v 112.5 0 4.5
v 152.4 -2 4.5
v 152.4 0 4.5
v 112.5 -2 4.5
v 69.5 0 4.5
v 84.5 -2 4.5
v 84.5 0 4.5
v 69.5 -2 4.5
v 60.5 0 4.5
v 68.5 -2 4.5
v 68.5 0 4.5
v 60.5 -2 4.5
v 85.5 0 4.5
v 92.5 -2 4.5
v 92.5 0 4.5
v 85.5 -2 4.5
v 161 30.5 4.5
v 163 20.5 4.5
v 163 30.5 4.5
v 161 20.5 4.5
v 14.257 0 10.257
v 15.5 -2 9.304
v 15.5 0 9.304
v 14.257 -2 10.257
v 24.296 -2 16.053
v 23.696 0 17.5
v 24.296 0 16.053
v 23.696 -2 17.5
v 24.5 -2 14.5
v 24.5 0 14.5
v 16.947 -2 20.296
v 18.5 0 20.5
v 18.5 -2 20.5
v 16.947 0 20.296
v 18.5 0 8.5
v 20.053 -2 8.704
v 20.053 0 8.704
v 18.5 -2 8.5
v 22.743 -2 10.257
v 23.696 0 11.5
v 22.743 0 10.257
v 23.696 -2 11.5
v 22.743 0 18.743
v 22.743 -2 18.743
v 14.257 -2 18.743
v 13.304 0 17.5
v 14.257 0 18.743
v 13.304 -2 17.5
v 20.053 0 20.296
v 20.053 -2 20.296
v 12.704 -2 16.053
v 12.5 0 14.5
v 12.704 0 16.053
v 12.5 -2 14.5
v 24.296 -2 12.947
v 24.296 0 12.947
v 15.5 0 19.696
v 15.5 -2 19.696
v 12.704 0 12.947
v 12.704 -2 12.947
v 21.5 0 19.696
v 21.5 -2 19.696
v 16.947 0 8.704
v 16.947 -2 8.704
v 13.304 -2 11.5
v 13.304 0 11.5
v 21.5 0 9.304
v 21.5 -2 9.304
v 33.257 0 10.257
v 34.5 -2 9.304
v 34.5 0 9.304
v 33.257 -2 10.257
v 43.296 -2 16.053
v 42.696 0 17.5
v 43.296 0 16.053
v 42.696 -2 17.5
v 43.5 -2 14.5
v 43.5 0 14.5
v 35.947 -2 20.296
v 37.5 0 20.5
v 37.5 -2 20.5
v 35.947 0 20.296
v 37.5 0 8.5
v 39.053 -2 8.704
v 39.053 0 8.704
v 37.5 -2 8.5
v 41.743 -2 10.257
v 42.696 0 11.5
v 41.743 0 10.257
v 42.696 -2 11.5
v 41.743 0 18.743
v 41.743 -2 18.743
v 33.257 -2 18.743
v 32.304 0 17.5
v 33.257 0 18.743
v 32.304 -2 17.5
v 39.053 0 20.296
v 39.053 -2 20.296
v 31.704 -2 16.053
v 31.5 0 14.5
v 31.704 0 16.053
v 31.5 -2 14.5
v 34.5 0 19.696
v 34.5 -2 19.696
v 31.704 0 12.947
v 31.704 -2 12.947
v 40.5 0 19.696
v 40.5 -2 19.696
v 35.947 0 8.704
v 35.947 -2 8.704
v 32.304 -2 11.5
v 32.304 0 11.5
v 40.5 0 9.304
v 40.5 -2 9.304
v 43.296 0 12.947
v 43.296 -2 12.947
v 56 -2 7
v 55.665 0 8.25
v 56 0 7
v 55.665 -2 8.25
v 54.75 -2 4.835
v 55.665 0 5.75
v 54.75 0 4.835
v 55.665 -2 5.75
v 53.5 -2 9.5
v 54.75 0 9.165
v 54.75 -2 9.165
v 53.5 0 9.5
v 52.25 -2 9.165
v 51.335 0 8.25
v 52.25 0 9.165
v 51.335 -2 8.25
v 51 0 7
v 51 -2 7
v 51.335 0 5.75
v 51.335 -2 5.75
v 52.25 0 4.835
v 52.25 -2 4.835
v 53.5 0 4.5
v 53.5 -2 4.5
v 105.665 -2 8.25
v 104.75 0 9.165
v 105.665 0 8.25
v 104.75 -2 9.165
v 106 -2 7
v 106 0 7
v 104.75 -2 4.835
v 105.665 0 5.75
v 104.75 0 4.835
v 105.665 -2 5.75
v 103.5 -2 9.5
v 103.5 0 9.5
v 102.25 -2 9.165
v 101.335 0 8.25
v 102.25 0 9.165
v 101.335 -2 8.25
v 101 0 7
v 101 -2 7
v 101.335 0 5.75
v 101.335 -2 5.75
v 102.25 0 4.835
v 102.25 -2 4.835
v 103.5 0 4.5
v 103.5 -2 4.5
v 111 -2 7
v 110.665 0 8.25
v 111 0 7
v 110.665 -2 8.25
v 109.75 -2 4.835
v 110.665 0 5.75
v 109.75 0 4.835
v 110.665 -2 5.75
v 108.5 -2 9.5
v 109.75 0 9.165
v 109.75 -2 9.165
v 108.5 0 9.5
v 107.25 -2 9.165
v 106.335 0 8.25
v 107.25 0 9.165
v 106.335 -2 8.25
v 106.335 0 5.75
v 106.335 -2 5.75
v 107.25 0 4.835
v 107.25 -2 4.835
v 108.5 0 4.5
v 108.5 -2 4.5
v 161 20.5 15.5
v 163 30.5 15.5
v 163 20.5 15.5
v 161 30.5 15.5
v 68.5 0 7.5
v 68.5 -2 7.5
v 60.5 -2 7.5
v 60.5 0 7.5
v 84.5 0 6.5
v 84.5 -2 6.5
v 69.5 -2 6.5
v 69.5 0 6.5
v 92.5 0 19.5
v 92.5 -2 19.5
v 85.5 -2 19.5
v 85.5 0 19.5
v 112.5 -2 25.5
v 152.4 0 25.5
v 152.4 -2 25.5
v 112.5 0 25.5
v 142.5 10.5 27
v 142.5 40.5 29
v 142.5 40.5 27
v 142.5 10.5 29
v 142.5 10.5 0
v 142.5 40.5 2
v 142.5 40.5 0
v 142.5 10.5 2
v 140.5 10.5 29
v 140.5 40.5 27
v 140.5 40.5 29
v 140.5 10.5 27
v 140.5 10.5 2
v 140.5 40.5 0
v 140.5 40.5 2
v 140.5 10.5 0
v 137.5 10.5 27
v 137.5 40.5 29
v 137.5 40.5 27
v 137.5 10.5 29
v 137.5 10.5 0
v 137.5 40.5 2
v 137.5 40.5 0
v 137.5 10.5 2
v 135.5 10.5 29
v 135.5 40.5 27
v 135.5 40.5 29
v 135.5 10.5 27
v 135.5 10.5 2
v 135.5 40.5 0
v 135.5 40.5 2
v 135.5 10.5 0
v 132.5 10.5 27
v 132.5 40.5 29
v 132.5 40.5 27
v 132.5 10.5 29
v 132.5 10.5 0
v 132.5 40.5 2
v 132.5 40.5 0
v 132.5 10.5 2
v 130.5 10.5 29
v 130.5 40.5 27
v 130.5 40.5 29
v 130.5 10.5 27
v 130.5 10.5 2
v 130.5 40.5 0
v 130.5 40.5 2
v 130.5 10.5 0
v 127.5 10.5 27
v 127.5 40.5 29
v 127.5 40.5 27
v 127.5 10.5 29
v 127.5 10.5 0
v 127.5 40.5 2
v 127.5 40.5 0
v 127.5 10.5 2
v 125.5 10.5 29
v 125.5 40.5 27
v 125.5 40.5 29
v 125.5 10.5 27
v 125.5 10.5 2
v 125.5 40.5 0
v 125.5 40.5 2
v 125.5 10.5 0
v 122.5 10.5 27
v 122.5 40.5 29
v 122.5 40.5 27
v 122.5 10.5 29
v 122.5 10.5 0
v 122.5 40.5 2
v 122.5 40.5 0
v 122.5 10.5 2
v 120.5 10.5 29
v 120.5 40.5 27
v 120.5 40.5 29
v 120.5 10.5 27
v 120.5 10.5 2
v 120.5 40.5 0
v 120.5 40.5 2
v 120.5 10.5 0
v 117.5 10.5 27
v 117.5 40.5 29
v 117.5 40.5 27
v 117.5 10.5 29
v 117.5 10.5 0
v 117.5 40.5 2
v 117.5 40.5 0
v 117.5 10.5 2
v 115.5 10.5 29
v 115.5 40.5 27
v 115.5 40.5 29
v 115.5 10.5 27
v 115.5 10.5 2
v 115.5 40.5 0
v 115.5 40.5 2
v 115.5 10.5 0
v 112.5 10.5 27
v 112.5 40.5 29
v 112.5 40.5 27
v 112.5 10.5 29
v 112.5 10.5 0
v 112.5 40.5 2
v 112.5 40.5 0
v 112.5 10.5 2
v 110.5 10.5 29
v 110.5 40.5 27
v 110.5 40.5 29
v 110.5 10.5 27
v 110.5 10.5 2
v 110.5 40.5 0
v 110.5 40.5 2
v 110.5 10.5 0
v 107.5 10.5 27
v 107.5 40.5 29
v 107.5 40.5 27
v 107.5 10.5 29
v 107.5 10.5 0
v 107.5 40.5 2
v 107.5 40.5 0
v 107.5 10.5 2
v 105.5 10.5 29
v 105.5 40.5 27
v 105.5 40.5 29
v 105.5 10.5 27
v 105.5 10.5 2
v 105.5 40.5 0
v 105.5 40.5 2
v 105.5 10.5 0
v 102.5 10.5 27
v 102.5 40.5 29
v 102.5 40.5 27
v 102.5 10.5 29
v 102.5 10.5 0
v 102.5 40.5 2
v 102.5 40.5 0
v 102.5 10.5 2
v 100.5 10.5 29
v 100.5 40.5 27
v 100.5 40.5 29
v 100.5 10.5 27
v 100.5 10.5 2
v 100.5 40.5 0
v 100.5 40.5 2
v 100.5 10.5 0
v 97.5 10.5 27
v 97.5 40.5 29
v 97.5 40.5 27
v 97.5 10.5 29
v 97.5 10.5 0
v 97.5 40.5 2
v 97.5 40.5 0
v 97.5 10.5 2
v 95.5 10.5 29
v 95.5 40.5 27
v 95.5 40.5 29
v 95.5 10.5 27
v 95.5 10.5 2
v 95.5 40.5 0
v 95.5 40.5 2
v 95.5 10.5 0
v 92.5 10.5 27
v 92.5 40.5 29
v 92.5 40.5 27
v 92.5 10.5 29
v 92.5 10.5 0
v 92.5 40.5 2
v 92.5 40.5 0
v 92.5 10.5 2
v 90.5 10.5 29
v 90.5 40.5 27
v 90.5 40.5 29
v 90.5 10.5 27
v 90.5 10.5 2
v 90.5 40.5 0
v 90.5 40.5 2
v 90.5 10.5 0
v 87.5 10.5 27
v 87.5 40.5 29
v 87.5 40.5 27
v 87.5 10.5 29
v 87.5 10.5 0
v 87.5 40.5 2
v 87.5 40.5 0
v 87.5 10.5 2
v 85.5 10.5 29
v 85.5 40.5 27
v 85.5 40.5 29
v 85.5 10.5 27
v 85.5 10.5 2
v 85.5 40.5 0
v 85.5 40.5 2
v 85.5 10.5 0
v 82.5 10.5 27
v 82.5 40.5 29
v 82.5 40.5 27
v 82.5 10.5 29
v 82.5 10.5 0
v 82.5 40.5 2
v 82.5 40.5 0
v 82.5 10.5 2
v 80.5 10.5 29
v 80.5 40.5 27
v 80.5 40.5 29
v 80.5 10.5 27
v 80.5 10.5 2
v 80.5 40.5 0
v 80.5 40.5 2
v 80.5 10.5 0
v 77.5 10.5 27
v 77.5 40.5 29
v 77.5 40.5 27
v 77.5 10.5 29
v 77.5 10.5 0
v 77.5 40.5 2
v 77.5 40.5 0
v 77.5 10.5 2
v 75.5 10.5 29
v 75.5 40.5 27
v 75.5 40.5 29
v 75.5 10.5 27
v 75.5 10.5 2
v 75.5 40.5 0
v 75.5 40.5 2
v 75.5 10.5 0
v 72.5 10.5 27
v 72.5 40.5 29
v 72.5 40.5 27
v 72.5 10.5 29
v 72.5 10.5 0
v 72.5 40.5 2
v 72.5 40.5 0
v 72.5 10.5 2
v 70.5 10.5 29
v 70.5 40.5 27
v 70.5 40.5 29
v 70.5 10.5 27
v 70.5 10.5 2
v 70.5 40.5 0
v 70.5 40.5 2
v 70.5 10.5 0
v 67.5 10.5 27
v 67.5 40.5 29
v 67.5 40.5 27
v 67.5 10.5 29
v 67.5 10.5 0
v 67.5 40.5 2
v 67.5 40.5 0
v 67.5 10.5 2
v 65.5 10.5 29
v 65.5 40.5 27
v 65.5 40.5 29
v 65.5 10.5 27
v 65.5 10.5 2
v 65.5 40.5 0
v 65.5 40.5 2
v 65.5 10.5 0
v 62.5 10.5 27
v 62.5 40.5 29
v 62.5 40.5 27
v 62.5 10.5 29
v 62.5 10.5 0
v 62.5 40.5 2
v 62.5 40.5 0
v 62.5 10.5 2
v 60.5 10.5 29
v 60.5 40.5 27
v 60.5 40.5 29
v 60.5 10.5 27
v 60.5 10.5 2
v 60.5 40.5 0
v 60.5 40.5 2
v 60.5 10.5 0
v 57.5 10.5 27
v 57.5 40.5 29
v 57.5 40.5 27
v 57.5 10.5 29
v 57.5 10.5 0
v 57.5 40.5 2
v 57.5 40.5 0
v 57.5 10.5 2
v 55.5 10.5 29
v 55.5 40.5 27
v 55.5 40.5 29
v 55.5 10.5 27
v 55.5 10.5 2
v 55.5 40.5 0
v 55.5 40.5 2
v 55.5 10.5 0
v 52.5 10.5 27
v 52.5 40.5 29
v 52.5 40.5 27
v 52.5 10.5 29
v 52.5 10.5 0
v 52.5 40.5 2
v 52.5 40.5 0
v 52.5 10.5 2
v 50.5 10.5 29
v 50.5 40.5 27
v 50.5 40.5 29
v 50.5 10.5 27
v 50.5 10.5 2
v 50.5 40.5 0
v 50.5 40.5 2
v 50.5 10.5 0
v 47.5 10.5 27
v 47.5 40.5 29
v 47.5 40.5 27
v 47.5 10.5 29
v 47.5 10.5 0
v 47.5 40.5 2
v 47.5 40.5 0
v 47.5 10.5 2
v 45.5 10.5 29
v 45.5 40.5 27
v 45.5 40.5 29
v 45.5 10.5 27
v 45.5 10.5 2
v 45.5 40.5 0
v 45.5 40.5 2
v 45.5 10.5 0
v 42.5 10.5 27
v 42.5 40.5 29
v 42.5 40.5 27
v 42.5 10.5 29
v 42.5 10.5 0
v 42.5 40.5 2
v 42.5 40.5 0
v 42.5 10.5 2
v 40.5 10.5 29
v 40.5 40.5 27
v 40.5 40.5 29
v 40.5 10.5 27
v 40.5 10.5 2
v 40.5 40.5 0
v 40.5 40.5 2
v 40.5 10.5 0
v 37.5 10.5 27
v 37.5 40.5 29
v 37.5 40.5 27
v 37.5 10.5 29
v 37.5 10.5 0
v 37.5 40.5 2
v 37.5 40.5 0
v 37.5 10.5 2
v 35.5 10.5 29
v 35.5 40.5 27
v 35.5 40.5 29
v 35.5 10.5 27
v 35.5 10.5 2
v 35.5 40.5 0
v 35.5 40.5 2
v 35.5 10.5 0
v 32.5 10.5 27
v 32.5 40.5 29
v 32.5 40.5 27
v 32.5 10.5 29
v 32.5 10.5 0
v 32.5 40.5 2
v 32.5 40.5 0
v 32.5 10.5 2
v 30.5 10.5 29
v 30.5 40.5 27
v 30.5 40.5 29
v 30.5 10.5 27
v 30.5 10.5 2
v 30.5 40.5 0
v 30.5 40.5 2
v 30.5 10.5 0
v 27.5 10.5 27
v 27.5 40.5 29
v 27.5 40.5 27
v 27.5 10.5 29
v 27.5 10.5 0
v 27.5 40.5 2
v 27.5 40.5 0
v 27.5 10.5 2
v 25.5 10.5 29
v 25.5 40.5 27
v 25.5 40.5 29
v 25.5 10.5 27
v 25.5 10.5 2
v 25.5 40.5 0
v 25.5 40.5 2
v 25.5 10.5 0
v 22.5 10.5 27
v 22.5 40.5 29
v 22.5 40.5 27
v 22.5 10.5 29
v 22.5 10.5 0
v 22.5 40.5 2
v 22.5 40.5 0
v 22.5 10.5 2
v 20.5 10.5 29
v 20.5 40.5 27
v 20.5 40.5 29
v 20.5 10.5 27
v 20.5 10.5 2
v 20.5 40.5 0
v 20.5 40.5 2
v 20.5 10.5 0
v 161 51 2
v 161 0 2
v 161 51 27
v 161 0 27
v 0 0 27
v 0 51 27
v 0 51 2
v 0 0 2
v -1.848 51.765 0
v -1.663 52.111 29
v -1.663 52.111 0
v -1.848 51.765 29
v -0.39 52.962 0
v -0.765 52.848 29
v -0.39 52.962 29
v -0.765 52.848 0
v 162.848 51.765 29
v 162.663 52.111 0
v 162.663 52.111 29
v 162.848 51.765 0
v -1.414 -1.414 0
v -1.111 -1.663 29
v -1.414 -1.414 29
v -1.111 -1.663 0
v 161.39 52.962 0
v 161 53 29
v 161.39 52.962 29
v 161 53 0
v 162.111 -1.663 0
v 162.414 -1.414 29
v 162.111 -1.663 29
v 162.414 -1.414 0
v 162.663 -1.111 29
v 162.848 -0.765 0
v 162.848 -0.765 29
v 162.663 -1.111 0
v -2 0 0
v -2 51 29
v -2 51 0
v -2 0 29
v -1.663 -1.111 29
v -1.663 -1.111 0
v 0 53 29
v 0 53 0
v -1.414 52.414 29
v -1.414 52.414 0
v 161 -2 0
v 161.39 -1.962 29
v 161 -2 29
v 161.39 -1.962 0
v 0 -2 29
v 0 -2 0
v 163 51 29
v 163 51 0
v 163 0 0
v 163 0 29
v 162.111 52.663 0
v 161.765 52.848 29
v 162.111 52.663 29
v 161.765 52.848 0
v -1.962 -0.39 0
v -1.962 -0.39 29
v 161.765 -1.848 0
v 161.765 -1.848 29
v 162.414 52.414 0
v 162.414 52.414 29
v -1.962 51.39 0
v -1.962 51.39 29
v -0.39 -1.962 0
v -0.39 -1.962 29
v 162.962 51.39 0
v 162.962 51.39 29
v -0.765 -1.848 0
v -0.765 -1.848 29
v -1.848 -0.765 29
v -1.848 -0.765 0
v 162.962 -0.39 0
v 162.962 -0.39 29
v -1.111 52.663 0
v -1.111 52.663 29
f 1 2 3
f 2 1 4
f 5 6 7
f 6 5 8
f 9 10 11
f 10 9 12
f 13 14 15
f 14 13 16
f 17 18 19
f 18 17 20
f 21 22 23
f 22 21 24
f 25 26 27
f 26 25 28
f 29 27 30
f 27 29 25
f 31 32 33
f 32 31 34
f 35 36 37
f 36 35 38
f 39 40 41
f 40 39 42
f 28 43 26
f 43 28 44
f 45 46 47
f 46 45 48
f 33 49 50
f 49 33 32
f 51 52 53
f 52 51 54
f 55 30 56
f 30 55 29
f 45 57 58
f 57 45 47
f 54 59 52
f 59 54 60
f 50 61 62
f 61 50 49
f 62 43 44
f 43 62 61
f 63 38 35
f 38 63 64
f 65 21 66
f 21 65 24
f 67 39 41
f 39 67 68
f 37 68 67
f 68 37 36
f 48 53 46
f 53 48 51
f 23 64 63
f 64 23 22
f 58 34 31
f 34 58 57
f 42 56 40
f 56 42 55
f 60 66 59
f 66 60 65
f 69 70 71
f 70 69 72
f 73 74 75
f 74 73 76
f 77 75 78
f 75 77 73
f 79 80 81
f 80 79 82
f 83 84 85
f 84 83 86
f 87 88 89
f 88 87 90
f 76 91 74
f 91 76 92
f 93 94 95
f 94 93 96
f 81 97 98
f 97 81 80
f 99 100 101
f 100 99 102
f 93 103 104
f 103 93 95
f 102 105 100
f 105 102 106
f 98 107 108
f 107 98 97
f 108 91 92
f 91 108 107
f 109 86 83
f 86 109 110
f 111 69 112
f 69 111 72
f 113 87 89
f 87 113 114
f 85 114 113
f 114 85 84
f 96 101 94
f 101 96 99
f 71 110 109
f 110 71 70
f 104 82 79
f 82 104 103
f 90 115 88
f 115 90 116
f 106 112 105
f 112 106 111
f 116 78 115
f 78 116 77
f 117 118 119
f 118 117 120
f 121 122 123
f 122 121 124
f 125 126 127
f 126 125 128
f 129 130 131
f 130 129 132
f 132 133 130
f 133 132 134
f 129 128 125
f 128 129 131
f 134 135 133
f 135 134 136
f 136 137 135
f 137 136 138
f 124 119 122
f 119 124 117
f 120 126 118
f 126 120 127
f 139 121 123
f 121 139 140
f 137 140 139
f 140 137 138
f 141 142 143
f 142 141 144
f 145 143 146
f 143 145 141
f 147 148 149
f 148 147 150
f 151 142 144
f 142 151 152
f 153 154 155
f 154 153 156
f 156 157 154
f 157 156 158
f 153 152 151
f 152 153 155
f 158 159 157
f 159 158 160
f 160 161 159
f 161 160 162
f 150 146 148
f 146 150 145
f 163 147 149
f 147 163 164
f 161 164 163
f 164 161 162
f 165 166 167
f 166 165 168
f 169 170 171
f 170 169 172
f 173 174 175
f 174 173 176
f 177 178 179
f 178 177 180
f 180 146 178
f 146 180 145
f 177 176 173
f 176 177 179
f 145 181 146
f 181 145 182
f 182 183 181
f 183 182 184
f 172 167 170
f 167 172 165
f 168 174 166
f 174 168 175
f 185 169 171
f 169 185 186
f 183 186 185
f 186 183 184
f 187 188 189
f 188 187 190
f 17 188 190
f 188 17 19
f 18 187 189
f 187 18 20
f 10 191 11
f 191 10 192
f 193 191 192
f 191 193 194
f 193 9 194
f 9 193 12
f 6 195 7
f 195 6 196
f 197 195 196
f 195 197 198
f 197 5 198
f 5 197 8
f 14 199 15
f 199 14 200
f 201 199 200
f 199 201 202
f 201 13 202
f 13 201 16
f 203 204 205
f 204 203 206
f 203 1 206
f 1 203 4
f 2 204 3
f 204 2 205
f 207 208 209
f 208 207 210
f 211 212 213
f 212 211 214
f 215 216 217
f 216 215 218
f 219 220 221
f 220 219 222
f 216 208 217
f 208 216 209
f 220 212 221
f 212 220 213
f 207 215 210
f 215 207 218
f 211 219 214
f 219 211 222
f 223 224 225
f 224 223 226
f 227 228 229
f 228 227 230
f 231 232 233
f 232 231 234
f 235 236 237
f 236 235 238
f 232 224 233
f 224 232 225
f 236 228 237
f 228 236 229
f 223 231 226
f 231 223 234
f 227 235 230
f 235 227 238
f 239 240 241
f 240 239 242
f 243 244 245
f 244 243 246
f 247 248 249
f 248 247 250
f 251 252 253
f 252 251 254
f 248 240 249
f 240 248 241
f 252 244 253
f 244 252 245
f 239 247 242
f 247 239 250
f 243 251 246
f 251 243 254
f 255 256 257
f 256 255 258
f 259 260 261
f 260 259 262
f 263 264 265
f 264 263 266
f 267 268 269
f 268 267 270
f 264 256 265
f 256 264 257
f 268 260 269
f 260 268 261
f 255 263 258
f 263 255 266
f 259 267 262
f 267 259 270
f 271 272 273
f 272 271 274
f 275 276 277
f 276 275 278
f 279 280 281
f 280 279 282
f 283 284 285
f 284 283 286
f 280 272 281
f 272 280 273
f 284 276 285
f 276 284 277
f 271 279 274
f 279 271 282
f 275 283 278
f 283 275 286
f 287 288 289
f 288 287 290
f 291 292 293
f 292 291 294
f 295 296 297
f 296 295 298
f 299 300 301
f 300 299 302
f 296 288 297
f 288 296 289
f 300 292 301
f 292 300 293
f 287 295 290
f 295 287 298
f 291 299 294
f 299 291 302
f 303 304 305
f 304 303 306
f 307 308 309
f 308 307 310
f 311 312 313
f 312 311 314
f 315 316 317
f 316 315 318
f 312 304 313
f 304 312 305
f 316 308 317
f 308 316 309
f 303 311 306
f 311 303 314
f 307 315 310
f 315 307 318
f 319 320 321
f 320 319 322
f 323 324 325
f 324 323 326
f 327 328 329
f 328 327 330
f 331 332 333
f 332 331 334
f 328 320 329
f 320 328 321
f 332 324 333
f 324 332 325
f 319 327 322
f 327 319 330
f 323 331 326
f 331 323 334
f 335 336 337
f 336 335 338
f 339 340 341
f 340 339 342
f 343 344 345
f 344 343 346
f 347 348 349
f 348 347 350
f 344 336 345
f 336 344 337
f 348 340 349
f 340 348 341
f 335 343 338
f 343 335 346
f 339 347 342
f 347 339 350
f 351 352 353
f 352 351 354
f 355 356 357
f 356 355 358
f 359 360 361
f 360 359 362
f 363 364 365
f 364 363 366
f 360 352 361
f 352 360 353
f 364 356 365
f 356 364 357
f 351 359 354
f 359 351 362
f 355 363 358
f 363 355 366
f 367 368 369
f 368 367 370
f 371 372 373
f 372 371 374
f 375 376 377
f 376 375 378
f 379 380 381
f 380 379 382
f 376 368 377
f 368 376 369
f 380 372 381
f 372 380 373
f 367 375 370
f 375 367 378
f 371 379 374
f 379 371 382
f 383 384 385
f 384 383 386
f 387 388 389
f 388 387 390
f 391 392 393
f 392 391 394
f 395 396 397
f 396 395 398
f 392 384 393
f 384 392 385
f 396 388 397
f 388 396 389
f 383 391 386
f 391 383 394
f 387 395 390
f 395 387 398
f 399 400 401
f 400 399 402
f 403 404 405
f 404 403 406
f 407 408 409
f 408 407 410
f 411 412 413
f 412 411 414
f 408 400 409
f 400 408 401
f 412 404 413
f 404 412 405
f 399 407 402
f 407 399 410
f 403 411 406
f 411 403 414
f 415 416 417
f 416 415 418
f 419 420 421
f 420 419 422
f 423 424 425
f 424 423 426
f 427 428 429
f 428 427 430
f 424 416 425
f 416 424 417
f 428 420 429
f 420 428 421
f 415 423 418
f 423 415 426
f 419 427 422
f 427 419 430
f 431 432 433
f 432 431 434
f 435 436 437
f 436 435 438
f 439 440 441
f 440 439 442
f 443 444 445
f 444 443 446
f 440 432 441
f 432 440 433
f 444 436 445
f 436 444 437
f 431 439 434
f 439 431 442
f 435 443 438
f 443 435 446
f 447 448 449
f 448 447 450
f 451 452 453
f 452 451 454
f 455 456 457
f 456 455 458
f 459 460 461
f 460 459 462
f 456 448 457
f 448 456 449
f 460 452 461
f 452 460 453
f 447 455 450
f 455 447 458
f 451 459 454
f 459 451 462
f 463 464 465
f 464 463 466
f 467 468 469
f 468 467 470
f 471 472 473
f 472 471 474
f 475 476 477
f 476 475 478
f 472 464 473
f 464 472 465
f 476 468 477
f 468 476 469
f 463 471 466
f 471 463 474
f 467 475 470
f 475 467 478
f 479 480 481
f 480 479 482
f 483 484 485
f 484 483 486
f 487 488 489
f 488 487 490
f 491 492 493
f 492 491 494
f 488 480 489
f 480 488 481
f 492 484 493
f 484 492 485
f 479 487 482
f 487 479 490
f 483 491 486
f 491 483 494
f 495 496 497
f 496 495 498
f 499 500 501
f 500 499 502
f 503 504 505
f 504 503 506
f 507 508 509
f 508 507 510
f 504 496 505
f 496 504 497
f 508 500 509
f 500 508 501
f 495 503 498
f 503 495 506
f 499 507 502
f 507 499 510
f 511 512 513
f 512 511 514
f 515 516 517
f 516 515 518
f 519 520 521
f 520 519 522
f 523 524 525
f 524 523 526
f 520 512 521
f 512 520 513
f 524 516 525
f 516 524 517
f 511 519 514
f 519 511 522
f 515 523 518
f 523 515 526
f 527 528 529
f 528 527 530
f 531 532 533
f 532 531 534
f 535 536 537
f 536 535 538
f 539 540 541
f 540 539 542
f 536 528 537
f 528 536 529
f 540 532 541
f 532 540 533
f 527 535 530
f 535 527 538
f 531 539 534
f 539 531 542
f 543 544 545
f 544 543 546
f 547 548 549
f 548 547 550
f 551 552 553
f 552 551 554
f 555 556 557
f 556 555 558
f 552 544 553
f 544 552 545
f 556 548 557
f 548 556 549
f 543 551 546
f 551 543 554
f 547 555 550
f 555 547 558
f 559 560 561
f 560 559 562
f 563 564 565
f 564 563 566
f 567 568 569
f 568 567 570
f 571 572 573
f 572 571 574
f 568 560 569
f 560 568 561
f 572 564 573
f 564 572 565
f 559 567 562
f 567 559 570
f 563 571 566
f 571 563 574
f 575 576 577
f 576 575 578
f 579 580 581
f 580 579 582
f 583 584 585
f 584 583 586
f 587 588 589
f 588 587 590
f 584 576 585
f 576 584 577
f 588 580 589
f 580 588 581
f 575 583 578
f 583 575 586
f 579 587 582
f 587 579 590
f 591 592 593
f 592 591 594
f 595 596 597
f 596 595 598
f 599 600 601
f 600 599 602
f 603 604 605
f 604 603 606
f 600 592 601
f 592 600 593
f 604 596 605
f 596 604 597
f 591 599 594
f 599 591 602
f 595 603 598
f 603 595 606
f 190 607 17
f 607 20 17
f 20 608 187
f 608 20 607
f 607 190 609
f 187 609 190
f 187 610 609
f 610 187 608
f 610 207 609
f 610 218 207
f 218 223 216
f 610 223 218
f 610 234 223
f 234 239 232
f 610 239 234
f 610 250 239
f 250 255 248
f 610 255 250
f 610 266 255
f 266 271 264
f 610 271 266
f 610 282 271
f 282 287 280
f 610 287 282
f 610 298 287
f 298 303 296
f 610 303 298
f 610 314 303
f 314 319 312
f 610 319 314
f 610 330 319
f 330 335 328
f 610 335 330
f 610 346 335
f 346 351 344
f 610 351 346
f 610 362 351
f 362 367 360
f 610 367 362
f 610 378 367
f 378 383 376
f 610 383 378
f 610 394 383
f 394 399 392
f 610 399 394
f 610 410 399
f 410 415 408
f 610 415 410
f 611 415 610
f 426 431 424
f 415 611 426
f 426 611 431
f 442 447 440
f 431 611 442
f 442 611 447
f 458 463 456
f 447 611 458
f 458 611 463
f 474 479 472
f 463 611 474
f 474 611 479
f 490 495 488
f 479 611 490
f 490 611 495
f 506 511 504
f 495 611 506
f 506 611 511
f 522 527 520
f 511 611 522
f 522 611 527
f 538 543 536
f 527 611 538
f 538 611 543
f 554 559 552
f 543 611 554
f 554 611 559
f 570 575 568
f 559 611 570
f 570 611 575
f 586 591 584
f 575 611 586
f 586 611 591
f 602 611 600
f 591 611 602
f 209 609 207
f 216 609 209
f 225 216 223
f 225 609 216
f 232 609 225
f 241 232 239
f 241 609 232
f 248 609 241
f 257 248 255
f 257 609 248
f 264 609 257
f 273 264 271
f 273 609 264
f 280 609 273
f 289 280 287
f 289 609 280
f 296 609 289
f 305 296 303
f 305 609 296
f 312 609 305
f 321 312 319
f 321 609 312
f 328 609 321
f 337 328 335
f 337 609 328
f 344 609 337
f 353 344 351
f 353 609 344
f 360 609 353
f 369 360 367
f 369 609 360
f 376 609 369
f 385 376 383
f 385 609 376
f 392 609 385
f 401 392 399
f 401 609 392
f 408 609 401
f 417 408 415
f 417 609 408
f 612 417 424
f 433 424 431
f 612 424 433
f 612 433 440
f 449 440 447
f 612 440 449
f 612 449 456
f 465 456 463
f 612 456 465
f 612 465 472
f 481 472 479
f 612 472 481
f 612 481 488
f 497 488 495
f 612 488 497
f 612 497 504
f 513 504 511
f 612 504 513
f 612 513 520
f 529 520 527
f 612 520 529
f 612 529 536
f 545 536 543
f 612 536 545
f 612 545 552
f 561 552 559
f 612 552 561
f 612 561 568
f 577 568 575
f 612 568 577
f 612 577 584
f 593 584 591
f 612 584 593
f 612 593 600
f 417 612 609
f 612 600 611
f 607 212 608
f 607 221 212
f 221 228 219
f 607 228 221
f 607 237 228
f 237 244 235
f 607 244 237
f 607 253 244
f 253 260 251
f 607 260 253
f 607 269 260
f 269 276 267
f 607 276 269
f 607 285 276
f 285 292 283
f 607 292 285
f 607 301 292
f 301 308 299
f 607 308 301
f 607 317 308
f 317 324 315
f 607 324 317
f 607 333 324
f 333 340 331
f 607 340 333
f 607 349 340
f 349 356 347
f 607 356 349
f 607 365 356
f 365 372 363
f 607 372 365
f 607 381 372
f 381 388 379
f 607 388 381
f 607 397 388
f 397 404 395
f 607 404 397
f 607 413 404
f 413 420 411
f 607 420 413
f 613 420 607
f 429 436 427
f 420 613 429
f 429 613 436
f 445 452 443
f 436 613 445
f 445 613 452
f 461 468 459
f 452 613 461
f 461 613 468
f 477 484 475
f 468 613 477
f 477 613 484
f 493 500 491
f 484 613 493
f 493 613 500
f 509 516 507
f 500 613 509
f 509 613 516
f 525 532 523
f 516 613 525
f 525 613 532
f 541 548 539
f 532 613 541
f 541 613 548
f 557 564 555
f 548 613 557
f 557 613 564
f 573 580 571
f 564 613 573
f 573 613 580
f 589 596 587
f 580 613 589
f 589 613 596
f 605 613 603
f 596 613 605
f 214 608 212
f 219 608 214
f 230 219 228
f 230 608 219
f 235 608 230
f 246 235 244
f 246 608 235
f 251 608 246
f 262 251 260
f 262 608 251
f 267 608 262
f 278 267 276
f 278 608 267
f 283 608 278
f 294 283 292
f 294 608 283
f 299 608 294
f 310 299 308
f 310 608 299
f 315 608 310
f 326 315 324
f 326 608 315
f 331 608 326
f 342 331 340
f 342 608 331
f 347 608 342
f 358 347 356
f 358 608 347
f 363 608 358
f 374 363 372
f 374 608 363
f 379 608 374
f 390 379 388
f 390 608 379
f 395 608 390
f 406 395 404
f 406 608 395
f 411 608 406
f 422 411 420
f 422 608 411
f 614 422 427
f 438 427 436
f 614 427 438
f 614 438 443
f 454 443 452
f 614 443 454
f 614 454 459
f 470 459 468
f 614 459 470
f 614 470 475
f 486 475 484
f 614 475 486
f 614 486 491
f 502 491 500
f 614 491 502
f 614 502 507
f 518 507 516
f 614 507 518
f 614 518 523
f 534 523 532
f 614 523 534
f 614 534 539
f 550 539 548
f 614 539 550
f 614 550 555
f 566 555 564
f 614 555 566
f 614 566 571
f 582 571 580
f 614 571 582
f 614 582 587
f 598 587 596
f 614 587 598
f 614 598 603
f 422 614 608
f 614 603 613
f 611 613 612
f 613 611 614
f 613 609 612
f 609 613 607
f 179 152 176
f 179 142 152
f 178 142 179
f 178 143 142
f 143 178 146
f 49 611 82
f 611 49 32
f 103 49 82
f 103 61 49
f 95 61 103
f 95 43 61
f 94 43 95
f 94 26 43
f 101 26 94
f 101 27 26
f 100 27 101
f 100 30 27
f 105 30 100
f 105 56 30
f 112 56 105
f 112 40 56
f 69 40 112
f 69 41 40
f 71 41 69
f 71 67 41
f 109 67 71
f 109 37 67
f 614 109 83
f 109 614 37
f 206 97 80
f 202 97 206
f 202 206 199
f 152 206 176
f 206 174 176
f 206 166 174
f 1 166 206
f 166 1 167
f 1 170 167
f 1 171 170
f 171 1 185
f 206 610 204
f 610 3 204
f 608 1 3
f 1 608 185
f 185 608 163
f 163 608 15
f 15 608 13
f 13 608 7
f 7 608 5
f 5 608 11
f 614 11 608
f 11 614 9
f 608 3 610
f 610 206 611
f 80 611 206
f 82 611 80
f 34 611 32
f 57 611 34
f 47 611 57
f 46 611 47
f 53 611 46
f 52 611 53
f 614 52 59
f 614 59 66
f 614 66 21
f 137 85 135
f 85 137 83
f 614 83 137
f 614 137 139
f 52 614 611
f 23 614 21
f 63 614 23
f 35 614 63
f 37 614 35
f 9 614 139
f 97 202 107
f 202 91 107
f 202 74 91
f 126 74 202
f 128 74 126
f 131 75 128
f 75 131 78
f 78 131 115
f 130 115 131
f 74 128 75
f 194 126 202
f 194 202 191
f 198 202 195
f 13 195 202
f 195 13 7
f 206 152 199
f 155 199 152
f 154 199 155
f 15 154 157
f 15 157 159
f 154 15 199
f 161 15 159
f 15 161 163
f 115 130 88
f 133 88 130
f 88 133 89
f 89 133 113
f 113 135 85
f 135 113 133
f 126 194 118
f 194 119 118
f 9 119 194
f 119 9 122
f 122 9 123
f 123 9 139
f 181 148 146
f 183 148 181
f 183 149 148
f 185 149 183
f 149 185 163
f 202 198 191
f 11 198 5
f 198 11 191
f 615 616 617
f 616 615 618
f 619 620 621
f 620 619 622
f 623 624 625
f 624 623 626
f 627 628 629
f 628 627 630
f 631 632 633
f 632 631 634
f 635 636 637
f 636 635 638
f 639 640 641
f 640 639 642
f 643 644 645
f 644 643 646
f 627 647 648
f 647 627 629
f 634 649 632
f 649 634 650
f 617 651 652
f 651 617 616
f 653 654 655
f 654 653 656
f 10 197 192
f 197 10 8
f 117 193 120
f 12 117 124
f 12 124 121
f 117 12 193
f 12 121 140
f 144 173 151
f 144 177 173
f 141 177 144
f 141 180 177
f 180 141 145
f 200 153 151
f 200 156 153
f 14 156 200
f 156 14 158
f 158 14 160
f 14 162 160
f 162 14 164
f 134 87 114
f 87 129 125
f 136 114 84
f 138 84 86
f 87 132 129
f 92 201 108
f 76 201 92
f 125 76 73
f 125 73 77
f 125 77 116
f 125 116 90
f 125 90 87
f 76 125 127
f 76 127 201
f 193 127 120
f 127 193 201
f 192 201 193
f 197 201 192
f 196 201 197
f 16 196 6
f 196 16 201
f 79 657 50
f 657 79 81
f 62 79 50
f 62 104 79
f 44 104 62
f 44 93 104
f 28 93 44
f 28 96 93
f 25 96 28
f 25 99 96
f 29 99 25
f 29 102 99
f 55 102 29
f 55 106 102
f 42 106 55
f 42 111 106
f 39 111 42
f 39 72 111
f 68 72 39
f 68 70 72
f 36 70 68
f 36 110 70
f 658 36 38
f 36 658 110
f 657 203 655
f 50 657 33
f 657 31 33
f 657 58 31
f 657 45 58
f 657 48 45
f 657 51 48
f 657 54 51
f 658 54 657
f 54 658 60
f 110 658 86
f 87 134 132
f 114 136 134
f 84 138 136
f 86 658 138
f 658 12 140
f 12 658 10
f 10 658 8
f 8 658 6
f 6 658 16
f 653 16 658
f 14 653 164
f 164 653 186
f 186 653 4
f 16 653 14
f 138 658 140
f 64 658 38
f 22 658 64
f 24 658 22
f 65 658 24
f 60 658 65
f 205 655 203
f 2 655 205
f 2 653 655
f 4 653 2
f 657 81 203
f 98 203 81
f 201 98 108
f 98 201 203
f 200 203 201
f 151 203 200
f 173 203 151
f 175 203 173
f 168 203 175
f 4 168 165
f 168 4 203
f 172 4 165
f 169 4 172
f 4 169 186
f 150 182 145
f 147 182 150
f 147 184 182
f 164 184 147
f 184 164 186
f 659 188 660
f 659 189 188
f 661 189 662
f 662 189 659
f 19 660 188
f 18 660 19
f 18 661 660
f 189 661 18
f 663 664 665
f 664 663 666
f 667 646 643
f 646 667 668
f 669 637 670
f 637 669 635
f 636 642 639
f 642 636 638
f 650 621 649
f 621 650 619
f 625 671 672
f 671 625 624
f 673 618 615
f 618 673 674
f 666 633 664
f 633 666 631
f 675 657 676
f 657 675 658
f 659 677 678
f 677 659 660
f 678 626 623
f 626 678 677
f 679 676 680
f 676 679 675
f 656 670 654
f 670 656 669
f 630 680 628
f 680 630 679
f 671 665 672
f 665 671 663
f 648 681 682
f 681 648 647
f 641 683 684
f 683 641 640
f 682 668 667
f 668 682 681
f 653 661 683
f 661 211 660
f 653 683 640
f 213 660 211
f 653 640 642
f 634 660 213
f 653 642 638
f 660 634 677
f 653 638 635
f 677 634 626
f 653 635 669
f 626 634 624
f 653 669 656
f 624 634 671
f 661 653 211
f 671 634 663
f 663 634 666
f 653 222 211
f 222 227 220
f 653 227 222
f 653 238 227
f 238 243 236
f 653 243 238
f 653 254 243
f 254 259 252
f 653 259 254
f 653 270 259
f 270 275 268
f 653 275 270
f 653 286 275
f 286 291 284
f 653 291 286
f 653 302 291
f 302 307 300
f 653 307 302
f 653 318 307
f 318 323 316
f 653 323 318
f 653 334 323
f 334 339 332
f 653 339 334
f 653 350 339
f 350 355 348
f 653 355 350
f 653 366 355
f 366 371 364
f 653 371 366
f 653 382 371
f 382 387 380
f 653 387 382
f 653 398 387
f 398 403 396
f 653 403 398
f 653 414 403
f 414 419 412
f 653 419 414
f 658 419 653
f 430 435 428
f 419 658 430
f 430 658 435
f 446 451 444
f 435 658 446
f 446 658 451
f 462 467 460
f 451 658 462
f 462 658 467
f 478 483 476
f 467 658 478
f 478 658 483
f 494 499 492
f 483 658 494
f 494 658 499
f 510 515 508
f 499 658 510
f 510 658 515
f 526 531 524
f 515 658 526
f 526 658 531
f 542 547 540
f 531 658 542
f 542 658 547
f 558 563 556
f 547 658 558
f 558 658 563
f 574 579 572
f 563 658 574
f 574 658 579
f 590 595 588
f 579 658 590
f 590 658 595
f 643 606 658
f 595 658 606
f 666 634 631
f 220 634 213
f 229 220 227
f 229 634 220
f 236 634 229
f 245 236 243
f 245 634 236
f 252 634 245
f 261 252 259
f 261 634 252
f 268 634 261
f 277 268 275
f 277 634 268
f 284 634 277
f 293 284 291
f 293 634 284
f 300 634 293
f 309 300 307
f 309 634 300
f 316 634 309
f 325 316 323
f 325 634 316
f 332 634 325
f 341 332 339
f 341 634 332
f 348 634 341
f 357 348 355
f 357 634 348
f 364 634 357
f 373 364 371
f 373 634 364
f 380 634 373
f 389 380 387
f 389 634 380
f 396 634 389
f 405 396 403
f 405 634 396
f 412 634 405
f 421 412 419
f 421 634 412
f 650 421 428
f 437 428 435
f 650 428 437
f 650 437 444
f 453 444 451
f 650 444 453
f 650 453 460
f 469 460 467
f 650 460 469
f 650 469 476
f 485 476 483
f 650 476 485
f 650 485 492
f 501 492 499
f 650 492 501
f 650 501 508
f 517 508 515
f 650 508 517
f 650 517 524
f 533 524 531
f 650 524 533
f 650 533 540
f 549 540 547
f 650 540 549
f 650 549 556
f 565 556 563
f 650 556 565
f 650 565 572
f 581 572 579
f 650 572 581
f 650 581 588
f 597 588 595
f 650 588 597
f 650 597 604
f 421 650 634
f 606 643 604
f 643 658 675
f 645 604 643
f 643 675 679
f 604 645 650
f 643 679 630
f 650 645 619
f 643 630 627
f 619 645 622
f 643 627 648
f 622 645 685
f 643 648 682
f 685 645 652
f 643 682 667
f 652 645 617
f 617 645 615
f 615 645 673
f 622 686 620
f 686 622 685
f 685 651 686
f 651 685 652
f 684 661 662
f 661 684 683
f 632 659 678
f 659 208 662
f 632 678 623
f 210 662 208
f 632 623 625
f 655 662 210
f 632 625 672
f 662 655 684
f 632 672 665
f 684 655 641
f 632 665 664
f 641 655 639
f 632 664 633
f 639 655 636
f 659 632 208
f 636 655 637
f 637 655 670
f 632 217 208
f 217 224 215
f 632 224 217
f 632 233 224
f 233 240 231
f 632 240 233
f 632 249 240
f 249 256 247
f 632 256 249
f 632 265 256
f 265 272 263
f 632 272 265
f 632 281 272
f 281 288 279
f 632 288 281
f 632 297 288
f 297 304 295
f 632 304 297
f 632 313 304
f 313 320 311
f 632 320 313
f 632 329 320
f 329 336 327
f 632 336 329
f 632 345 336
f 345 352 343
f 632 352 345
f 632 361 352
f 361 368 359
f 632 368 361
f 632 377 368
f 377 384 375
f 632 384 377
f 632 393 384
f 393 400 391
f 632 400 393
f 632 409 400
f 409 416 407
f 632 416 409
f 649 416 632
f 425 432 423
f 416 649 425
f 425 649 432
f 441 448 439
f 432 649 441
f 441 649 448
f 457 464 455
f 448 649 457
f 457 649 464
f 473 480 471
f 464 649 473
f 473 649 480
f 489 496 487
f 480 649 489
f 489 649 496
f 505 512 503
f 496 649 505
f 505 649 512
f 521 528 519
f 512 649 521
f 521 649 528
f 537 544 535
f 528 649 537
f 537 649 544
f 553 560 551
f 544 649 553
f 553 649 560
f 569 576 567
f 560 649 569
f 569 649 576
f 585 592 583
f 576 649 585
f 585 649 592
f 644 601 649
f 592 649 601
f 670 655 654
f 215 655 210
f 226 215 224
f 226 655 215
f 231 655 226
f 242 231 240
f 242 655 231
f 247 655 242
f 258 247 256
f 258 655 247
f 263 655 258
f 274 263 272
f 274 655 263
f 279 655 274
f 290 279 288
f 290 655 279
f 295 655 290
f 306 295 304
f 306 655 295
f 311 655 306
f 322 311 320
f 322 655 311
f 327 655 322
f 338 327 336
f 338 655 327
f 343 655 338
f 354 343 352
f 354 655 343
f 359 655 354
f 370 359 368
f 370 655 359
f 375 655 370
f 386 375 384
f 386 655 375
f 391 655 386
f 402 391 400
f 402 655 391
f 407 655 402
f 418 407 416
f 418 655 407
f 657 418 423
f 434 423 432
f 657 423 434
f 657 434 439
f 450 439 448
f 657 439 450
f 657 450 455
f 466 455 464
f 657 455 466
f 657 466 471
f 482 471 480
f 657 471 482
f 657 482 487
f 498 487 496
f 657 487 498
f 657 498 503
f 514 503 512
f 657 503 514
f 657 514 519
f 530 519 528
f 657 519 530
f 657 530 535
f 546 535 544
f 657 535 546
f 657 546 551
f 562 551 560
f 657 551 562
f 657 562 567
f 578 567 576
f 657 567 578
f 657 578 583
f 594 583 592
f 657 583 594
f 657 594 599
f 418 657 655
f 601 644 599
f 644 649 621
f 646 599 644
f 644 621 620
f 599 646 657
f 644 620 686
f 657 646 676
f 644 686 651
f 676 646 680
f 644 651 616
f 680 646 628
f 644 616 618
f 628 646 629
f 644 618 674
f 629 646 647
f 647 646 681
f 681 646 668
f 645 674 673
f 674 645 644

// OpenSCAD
// file: axoloti-board.scad
module axoloti_board(ex=0) {
    // axoloti board
    difference() {
        cube([160,50,2]);
        // recess at switches
        translate([104.25, 0, 0]) cube(size=[8, 1, 10], center=true);
        translate([100.25, 0, 0]) cylinder(r=1/2, h=10, center=true, $fn=12);
        translate([108.25, 0, 0]) cylinder(r=1/2, h=10, center=true, $fn=12);
        // mounting holes
        translate([3.5, 11, 0]) cylinder(r=3/2, h=10, center=true, $fn=12);
        translate([3.5, 40, 0]) cylinder(r=3/2, h=10, center=true, $fn=12);
        translate([44, 40, 0]) cylinder(r=3/2, h=10, center=true, $fn=12);
        translate([106, 11, 0]) cylinder(r=3/2, h=10, center=true, $fn=12);
        translate([106, 40, 0]) cylinder(r=3/2, h=10, center=true, $fn=12);
        translate([116, 11, 0]) cylinder(r=3/2, h=10, center=true, $fn=12);
        translate([116, 40, 0]) cylinder(r=3/2, h=10, center=true, $fn=12);
        translate([156.5, 11, 0]) cylinder(r=3/2, h=10, center=true, $fn=12);
        translate([156.5, 40, 0]) cylinder(r=3/2, h=10, center=true, $fn=12);
        // split
        translate([110, -.01, -5]) cube(size=[2, 5.5, 10]);
        translate([110, 15, -5]) cube(size=[2, 8, 10]);
        translate([110, 41, -5]) cube(size=[2, 18, 10]);
    }
    translate([0,0,2]) color([.4,1,.4,1]) {
        // IN 6.3 jack
        translate([9,0,0]) {
            cube([18,25,20]);
            translate([18/2,10,10]) rotate([90,0,0]) cylinder(h=20+ex, r=12/2, $fn=24);
        }
        // OUT 6.3 jack
        translate([28,0,0]) {
            cube([18,25,20]);
            translate([18/2,20/2,10]) rotate([90,0,0]) cylinder(h=20+ex, r=12/2, $fn=24);
        }
        // headphone jack
        translate([50,0,0]) {
            cube([6,15,5]);
            translate([6/2,6/2,5/2]) rotate([90,0,0]) cylinder(h=6+ex, r=5/2, $fn=12);
        }
        // micro usb
        translate([60,-1.5-ex,0]) {
            cube([8,6+ex,3]);
        }
        // uSD
        translate([69,0-ex,0]) {
            cube([15,16+ex,2]);
        }
        // USB
        translate([85,-1.5-ex,0]) {
            cube([7,20+ex,15]);
        }
        // LED2
        translate([93,0,0]) {
            cube(size=[2, .5, .5]);
        }
        // LED1
        translate([96,0,0]) {
            cube(size=[2, .5, .5]);
        }
        // S2
        translate([100,0,0]) {
            translate([0, .5, 0]) cube(size=[3.5, 3, 1]);
            translate([1.5/2, 0, 0]) cube(size=[2, 1, 1]);
            if (ex>0) {
                translate([6/2,6/2,5/2]) rotate([90,0,0]) cylinder(h=6+ex, r=5/2, $fn=12);
            }
        }
        // S1
        translate([105,0,0]) {
            translate([0, .5, 0]) cube(size=[3.5, 3, 1]);
            translate([1.5/2, 0, 0]) cube(size=[2, 1, 1]);
            if (ex>0) {
                translate([6/2,6/2,5/2]) rotate([90,0,0]) cylinder(h=6+ex, r=5/2, $fn=12);
            }
        }
        // MIDI IN
        translate([112,-.3,0]) {
            difference(){
                if (ex==0) {
                    translate([0, 0-ex, 0]) cube(size=[20-.1, 14+ex, 21]);
                } else {
                    translate([0, 0-ex, 0]) cube(size=[20-.1+.2, 14+ex, 21]);
                }
                if (ex==0) {
                    translate([20/2, 0, 20/2]) rotate([90, 0, 0]) cylinder(r=15/2, h=2, center=true);
                    translate([1.5, 0, 6]) rotate([90, 0, 0]) cylinder(r=2/2, h=20, center=true, $fn=12);
                    translate([20-1.5, 0, 6]) rotate([90, 0, 0]) cylinder(r=2/2, h=20, center=true, $fn=12);
                    translate([20/2, 0, 21-1.5]) rotate([90, 0, 0]) cylinder(r=2/2, h=20, center=true, $fn=12);
                }
            }
        }
        // MIDI OUT
        translate([132,-.3,0]) {
            difference(){
                translate([0, 0-ex, 0]) cube(size=[20-.1, 14+ex, 21]);
                if (ex==0) {
                    translate([20/2, 0, 20/2]) rotate([90, 0, 0]) cylinder(r=15/2, h=2, center=true);
                    translate([1.5, 0, 6]) rotate([90, 0, 0]) cylinder(r=2/2, h=20, center=true, $fn=12);
                    translate([20-1.5, 0, 6]) rotate([90, 0, 0]) cylinder(r=2/2, h=20, center=true, $fn=12);
                    translate([20/2, 0, 21-1.5]) rotate([90, 0, 0]) cylinder(r=2/2, h=20, center=true, $fn=12);
                }
            }
        }
        // Power
        translate([160,20,0]) {
            translate([-10, 0, 0]) {
                difference(){
                    cube(size=[14+ex, 10, 11]);
                    if (ex==0) {
                        translate([8, 10/2, 6]) rotate([0, 90, 0]) cylinder(r=6/2, h=14, center=true, $fn=24);
                    }
                }
                translate([7, 10/2, 6]) rotate([0, 90, 0]) cylinder(r=1/2, h=14, center=true, $fn=12);

            }
        }
    }
} // module

axoloti_board();
// main file
// case for axoloti

THICK=2;    // wall thickness
ROUND=2;    // corner radius
SCREW=3;    // screw diameter
GAP=.5;     // tolerance for board

VENT_X=2;
VENT_Y=30;
VENT_DIST=5;
VENT_N=25;

BRD_X=160;
BRD_Y=50;
BRD_Z=24;


use <axoloti-board.scad>;

module inner() {
    cube(size=[BRD_X+(GAP*2), BRD_Y+(GAP*2), BRD_Z+(GAP*2)], center=false);
    translate([GAP, GAP, GAP]) axoloti_board(ex=10);
    for (i=[0:VENT_N-1]) {
        translate([BRD_X/2+GAP+((VENT_N/2-i-.5)*VENT_DIST), BRD_Y/2+GAP-VENT_Y/2, -BRD_Z]) cube(size=[VENT_X, VENT_Y, BRD_Z*3], center=false);
    }

}

module outer() {
    translate([-THICK+ROUND, -THICK+ROUND, 0])
    linear_extrude(height=BRD_Z+(GAP*2)+(THICK*2))
    minkowski() {
        circle(r=ROUND, $fn=32);
        square(size=[BRD_X+(GAP*2)+(THICK*2)-(ROUND*2), BRD_Y+(GAP*2)+(THICK*2)-(ROUND*2)], center=false);
    }
}


module combine() {
    difference() {
        outer();
        translate([0, 0, THICK]) inner();
    }
}

combine();
